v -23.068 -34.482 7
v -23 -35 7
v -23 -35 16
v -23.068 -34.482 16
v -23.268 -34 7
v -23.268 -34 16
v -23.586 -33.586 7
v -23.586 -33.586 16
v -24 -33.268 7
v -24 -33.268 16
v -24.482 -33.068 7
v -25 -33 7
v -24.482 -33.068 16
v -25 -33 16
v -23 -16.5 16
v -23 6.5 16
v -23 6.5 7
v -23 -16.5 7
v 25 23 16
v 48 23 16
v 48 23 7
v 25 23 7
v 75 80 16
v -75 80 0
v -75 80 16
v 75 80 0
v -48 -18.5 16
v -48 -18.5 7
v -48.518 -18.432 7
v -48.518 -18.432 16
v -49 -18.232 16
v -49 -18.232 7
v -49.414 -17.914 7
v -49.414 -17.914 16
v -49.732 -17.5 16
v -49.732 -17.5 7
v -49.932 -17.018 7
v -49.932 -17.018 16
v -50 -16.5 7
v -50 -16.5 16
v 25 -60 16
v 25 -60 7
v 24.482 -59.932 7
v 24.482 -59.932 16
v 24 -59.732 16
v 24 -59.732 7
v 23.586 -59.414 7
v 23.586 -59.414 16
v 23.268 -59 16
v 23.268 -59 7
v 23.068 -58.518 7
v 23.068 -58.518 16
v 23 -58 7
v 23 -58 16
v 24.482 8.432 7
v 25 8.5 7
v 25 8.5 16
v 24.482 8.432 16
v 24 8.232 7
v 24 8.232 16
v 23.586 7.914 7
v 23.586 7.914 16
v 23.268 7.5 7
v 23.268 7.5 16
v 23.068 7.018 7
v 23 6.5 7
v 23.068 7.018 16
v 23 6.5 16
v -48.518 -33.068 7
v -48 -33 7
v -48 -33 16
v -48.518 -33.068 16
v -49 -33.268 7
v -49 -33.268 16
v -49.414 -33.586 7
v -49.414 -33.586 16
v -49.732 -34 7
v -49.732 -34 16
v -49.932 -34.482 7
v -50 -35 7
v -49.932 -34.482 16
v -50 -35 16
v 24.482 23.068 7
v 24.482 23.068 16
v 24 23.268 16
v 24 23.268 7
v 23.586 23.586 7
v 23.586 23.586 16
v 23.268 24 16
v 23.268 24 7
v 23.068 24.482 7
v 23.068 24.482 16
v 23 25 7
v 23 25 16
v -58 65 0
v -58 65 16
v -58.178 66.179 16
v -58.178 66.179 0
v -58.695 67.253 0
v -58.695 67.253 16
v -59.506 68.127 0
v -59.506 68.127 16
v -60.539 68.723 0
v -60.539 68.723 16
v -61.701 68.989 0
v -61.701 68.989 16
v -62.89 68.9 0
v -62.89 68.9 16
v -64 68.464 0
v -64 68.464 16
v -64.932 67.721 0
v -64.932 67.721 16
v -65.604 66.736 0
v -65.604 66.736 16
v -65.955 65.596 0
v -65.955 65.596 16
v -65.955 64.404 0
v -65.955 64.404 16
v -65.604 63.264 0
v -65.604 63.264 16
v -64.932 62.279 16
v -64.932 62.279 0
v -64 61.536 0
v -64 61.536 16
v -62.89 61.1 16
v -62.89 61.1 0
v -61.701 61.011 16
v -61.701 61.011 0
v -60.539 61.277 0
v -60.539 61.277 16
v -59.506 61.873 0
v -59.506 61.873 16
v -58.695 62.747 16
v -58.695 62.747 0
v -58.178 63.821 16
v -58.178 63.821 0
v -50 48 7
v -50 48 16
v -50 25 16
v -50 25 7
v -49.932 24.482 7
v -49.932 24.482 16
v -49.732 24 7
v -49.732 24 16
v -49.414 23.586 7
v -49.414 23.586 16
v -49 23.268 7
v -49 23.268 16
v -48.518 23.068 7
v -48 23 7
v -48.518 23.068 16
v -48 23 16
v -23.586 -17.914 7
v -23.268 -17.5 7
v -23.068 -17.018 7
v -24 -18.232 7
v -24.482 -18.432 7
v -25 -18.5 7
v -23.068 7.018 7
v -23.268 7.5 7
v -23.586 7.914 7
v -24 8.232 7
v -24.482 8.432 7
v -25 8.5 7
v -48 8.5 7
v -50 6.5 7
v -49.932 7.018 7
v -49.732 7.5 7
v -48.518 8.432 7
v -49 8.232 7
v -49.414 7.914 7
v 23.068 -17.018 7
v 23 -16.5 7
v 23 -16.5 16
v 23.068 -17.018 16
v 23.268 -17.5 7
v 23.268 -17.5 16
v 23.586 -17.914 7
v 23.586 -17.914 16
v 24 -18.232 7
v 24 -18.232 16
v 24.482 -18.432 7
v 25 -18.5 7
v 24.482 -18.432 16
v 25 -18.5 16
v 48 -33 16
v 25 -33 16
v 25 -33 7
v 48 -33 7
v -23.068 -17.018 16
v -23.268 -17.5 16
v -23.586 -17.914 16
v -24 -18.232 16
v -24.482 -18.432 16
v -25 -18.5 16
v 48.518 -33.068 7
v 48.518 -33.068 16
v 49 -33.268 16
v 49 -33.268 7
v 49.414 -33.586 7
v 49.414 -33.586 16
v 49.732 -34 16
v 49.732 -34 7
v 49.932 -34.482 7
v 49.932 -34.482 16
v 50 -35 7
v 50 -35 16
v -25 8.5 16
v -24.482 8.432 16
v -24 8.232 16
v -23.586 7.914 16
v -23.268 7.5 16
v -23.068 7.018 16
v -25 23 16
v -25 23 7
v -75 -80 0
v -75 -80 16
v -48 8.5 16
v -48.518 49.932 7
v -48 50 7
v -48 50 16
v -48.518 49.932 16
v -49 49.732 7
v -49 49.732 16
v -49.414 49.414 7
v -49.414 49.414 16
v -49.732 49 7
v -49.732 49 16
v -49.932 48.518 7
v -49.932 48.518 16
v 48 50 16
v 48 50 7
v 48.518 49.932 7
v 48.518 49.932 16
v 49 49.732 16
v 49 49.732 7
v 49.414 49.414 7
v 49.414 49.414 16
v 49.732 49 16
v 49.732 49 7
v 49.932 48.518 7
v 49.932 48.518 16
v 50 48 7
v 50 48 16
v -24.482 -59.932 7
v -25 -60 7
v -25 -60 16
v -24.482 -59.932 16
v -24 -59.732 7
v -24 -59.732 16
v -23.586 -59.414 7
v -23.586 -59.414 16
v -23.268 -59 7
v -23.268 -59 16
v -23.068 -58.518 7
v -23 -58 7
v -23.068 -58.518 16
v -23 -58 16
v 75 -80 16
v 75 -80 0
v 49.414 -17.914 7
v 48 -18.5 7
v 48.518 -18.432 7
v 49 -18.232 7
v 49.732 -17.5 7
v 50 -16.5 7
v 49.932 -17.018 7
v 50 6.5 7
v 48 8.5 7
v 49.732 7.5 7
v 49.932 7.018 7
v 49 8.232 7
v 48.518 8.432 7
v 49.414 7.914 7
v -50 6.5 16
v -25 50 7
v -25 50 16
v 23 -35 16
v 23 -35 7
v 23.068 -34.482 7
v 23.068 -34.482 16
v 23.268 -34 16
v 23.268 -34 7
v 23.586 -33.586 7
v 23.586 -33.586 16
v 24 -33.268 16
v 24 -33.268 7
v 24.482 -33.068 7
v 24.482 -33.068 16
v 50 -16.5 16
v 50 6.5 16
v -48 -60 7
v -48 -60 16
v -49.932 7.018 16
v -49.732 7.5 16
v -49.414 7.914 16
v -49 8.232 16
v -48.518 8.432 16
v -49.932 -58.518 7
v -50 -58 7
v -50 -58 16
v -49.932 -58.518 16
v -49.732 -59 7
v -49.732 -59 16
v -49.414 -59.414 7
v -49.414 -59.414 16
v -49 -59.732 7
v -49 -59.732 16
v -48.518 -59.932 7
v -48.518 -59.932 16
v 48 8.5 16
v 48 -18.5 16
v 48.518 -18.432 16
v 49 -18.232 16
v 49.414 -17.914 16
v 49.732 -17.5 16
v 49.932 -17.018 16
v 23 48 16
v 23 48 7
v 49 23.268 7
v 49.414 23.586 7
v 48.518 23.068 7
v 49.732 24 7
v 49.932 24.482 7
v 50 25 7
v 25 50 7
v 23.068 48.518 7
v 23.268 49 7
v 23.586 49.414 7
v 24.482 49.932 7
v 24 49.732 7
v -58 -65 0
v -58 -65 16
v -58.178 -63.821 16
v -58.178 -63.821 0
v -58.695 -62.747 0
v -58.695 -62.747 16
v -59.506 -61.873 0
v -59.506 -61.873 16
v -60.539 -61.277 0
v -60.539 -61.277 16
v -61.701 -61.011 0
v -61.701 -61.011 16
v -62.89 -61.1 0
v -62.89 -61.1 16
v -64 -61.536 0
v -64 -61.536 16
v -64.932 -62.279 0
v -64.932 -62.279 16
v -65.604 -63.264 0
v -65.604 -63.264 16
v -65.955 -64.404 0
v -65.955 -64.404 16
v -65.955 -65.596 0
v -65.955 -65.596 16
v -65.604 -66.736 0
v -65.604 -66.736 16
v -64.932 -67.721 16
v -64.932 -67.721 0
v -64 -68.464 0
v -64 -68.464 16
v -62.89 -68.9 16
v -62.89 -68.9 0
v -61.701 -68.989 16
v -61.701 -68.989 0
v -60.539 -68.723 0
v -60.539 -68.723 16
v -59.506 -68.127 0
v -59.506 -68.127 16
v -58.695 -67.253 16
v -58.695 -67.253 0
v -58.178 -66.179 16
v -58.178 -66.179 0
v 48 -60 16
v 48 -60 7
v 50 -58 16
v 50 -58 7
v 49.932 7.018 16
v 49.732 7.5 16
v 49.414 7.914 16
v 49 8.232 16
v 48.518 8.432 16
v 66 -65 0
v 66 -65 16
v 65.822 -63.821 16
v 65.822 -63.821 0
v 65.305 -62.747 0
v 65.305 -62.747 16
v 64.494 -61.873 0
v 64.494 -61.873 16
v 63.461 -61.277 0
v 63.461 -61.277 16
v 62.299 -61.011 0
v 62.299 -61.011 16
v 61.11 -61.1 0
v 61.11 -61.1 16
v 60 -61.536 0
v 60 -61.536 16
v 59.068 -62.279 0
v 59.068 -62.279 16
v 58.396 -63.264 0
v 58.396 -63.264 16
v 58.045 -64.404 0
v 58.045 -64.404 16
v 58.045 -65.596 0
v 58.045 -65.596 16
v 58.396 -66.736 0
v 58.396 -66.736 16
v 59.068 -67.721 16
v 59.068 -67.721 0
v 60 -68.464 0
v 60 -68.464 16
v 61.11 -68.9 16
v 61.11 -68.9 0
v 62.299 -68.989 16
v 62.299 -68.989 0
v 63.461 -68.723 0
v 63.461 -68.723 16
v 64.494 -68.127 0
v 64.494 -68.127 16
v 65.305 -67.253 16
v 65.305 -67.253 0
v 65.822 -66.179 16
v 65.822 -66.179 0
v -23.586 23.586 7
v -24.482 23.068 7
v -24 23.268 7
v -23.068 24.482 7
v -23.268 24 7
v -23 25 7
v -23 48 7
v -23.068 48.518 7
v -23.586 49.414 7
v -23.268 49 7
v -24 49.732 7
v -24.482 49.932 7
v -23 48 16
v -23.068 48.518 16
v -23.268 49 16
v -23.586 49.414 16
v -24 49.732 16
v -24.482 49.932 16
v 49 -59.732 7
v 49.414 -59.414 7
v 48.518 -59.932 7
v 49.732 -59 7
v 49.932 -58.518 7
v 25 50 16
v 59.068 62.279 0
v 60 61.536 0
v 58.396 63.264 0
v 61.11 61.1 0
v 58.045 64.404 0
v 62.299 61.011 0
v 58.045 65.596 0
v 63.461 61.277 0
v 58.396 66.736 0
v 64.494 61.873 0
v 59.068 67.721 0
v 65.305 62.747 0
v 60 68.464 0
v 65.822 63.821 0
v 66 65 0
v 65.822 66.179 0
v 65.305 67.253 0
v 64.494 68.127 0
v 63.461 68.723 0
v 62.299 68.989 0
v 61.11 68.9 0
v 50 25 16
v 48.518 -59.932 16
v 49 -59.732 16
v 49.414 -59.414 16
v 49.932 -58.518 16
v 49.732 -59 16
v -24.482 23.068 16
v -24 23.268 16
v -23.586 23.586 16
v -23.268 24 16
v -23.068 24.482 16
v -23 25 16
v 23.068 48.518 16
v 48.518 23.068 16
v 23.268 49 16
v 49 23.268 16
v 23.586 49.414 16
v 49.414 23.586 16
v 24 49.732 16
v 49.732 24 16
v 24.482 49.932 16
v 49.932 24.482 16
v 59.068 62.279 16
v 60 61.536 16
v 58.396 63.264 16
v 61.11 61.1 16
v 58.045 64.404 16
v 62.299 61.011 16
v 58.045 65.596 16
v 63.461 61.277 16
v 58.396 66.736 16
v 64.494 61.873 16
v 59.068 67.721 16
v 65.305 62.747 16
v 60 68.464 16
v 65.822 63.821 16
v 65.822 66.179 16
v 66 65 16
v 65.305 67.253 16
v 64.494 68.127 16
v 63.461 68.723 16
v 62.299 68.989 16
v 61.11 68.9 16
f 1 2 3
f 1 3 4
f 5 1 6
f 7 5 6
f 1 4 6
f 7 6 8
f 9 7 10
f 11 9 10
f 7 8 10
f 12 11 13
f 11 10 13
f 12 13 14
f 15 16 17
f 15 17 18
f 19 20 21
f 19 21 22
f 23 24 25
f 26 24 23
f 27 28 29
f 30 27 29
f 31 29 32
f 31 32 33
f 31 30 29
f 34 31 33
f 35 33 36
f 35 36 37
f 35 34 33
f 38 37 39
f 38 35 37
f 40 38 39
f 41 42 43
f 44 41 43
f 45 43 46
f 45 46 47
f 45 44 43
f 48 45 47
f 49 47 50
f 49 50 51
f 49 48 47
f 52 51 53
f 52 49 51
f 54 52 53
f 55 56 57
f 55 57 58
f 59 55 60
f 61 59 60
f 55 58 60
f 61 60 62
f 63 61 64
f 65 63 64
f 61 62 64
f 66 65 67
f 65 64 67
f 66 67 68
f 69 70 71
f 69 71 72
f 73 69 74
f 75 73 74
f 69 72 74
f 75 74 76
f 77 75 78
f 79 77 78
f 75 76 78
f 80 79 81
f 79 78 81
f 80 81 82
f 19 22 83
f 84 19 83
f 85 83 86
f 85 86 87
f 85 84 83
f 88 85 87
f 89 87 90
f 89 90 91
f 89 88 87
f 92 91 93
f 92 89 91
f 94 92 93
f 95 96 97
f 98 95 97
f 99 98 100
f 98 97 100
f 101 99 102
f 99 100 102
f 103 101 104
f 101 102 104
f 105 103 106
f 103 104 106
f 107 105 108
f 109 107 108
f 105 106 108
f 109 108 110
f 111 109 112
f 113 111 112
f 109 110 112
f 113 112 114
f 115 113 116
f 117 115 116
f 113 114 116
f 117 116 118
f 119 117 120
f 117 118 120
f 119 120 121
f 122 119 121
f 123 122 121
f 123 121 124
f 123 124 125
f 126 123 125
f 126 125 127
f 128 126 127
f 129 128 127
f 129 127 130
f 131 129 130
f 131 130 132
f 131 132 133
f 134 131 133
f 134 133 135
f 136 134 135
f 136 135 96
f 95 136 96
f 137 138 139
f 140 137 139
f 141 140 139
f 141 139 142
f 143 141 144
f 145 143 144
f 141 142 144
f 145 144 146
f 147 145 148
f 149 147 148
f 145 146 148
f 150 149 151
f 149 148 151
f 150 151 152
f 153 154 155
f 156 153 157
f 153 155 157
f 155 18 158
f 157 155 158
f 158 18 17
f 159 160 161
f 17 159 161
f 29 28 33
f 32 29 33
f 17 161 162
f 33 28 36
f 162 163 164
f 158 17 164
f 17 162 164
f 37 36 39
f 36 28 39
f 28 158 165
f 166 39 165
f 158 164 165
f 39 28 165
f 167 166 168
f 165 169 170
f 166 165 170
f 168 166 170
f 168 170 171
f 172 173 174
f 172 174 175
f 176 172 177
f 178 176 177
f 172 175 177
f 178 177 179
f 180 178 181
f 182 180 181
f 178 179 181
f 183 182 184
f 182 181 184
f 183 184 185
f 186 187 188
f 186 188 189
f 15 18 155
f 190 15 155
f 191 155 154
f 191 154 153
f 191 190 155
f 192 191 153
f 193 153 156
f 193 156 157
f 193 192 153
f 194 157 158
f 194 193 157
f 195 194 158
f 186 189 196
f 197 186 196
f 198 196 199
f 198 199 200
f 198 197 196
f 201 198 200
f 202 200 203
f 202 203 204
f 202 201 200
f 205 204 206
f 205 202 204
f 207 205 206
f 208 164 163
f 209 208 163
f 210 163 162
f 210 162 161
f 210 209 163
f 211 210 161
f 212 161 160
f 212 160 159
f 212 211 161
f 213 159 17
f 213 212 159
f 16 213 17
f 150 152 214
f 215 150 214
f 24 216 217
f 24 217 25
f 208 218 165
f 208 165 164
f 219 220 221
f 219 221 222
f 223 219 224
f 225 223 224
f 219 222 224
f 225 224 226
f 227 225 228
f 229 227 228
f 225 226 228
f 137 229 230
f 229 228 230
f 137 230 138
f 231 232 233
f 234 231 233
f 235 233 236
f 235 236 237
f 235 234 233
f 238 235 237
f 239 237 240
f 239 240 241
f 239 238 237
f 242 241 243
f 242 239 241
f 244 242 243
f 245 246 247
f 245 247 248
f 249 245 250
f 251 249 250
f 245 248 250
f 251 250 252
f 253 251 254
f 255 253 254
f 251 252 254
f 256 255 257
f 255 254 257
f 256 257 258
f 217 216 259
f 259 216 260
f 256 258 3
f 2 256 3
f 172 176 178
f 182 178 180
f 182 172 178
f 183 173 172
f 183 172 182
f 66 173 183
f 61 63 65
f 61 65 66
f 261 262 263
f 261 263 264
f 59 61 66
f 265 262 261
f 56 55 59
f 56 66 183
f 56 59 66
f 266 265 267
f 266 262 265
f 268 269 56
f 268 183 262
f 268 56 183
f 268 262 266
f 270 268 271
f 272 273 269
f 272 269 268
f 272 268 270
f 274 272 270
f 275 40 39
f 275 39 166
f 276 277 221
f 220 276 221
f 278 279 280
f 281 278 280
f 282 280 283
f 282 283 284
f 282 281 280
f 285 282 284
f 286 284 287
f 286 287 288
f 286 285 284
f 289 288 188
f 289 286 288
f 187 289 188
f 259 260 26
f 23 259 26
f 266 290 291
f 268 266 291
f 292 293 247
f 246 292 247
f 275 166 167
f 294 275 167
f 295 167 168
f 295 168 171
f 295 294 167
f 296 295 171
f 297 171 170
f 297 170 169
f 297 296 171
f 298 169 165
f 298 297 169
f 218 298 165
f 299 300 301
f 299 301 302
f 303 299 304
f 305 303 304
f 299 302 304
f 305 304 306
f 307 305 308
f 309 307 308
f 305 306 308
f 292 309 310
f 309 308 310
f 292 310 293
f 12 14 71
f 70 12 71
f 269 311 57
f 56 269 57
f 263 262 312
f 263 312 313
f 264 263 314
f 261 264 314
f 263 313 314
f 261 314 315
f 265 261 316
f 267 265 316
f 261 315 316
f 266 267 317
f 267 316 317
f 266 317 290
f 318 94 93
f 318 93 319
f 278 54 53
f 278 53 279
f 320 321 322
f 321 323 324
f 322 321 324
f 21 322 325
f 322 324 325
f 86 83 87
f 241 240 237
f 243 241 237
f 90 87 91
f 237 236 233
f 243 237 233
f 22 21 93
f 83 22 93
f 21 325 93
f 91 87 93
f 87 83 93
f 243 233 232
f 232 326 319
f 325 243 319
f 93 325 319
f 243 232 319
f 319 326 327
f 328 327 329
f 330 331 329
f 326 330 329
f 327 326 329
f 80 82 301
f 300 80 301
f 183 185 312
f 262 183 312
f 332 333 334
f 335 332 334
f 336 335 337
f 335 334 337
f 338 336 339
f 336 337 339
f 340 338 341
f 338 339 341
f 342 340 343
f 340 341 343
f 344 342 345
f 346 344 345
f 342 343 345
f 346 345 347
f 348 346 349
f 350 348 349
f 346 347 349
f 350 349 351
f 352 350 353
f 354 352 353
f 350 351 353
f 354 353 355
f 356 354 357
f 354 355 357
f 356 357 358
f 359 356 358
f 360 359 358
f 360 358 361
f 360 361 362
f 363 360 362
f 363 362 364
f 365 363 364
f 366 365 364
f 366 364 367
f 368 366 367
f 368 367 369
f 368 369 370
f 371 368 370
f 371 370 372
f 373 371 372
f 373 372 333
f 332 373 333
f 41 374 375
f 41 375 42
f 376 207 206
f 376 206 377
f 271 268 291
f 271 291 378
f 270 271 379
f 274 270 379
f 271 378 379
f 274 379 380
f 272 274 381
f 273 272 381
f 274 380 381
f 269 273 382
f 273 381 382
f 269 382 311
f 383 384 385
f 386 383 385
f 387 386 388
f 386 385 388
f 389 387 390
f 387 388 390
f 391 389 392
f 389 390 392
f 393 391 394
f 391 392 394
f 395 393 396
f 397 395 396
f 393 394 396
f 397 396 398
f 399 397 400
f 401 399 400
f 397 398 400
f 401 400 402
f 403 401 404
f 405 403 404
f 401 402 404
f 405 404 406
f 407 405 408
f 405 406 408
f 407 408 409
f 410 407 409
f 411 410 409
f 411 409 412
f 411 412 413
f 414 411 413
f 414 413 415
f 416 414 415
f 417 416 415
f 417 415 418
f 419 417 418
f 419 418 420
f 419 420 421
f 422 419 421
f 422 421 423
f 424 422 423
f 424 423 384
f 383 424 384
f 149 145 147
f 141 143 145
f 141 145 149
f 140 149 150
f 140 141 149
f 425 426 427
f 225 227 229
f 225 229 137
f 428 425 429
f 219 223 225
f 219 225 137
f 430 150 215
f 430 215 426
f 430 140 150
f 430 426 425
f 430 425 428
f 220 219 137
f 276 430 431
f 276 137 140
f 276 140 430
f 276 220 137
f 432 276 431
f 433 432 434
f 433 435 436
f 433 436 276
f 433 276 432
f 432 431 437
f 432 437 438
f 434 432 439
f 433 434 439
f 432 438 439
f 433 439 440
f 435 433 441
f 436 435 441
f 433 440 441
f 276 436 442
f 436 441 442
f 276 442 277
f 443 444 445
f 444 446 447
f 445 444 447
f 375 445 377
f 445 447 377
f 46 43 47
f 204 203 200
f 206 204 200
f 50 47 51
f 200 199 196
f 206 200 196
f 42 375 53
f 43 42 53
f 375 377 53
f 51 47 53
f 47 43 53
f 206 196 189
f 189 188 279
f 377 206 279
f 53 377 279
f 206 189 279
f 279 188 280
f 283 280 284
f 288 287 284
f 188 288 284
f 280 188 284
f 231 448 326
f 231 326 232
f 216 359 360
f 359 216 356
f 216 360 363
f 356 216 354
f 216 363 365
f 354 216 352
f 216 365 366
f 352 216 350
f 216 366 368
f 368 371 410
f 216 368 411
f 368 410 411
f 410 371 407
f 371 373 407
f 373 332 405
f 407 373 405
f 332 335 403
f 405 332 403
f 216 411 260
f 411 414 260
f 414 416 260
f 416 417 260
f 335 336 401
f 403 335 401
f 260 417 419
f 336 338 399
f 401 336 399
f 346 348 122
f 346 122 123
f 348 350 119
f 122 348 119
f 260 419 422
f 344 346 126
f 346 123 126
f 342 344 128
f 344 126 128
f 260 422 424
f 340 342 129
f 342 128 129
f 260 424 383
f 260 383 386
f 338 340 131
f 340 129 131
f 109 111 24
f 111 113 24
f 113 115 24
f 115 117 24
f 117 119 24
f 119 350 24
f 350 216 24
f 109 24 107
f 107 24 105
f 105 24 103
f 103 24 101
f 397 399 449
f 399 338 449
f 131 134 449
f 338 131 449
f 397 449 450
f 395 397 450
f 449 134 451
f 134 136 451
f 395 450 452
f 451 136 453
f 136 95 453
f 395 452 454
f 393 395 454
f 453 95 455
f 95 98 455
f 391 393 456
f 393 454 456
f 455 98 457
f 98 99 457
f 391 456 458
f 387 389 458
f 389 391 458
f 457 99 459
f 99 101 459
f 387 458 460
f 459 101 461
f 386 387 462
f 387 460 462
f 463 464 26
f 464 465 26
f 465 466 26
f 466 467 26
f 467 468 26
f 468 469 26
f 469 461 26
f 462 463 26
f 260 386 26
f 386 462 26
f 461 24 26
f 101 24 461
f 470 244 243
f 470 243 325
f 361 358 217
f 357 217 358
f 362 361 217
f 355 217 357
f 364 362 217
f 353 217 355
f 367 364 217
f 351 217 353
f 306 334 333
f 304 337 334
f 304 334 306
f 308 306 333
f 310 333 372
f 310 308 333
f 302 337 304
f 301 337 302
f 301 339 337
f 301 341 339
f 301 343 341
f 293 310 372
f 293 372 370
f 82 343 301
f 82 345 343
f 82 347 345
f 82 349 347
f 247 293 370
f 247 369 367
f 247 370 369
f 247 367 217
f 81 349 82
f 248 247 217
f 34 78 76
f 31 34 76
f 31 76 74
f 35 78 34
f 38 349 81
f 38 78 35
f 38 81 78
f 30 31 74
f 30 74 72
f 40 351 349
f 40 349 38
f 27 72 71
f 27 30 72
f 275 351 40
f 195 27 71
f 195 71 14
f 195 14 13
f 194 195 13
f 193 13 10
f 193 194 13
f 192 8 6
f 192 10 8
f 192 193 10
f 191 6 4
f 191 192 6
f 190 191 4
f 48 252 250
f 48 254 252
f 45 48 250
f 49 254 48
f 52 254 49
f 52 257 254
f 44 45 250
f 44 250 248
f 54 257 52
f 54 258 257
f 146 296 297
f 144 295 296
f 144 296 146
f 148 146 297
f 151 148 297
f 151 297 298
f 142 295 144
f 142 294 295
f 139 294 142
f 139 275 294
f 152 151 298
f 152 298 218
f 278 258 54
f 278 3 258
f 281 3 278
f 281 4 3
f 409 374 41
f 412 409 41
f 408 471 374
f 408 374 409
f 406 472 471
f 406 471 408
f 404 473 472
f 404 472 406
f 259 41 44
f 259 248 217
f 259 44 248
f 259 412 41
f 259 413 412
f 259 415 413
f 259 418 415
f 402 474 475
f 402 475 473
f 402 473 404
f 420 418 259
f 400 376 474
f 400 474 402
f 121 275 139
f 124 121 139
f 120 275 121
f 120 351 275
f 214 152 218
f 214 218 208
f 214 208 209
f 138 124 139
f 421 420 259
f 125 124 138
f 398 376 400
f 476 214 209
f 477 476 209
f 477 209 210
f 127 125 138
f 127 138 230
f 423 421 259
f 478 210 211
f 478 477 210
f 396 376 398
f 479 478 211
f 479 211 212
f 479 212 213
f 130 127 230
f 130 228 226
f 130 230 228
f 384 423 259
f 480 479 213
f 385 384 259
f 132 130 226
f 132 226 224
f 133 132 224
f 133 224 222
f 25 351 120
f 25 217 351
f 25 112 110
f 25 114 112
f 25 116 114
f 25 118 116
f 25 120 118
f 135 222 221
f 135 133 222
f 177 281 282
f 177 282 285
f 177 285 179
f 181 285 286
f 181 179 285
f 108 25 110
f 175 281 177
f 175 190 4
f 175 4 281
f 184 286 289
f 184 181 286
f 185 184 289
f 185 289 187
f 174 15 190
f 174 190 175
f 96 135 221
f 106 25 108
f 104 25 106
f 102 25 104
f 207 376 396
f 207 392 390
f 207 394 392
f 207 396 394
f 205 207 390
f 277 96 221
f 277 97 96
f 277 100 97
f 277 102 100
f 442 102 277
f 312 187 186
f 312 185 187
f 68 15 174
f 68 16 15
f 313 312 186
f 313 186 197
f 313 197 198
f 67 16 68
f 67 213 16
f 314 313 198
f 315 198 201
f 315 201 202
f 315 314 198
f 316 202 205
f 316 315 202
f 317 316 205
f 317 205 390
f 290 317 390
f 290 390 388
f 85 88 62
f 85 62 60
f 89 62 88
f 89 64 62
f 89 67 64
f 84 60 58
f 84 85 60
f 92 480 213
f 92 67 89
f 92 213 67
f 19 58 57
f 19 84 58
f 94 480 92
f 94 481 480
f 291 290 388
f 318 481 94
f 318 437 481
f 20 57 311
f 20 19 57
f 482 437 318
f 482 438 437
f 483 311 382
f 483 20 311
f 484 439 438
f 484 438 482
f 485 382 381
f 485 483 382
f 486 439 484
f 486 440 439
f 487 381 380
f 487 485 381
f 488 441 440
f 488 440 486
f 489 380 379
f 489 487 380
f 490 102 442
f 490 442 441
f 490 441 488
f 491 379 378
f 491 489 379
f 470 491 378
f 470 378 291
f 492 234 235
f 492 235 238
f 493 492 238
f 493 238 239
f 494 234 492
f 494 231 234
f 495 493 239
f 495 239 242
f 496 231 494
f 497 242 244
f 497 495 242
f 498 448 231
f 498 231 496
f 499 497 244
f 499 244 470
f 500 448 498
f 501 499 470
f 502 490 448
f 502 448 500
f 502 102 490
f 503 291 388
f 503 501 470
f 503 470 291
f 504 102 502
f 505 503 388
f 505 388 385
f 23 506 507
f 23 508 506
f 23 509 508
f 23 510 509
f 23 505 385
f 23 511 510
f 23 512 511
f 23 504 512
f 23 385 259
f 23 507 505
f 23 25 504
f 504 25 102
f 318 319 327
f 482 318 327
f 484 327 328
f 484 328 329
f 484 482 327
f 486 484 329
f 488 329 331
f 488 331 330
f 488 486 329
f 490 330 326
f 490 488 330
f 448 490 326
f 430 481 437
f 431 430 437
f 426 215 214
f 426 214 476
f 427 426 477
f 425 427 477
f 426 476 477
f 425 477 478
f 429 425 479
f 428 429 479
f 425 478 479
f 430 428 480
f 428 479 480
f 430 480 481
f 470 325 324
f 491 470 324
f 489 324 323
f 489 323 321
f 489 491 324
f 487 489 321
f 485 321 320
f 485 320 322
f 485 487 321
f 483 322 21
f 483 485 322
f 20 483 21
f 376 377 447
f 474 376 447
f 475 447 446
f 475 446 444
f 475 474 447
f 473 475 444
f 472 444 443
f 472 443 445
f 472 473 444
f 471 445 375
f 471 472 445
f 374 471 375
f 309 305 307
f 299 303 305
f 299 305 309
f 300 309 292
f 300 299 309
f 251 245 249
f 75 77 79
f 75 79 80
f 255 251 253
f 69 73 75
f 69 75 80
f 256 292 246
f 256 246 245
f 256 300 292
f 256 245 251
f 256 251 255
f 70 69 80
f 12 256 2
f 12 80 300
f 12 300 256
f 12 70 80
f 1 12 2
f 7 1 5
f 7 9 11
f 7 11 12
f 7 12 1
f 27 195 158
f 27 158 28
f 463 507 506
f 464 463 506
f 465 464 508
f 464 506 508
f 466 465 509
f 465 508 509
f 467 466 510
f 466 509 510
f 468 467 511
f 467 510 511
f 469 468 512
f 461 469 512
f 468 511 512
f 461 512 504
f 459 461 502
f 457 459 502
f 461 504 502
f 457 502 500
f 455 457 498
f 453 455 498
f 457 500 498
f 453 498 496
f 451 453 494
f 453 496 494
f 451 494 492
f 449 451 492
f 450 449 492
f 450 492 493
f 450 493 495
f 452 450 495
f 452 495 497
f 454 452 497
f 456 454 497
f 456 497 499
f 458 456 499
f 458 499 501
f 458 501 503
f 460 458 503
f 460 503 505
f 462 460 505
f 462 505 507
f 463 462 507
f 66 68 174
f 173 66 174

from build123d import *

# Parameters (mm, degrees)
SKETCH1_W           = 150
SKETCH1_H           = 160
BOSS_EXTRUDE1_DEPTH = 16
CUT_EXTRUDE1_DEPTH  = 9
SKETCH3_R           = 4
CUT_EXTRUDE2_DEPTH  = 17


with BuildPart() as part:
    # Sketch1 → Boss-Extrude1 (new body)
    with BuildSketch(Plane.XY):
        Rectangle(SKETCH1_W, SKETCH1_H)
    extrude(amount=BOSS_EXTRUDE1_DEPTH)

    # Sketch2 → Cut-Extrude1 (cut)
    with BuildSketch(Plane.XY.offset(16)):
        with BuildLine():
            Line((-48, 23), (-25, 23))
            ThreePointArc((-25, 23), (-23.585786438, 23.585786438), (-23, 25))
            Line((-23, 25), (-23, 48))
            ThreePointArc((-23, 48), (-23.585786438, 49.414213562), (-25, 50))
            Line((-25, 50), (-48, 50))
            ThreePointArc((-48, 50), (-49.414213562, 49.414213562), (-50, 48))
            Line((-50, 48), (-50, 25))
            ThreePointArc((-50, 25), (-49.414213562, 23.585786438), (-48, 23))
        make_face()
        with BuildLine():
            Line((23, 25), (23, 48))
            ThreePointArc((23, 48), (23.585786438, 49.414213562), (25, 50))
            Line((25, 50), (48, 50))
            ThreePointArc((48, 50), (49.414213562, 49.414213562), (50, 48))
            Line((50, 48), (50, 25))
            ThreePointArc((50, 25), (49.414213562, 23.585786438), (48, 23))
            Line((48, 23), (25, 23))
            ThreePointArc((25, 23), (23.585786438, 23.585786438), (23, 25))
        make_face()
        with BuildLine():
            Line((-48, -60), (-25, -60))
            ThreePointArc((-25, -60), (-23.585786438, -59.414213562), (-23, -58))
            Line((-23, -58), (-23, -35))
            ThreePointArc((-23, -35), (-23.585786438, -33.585786438), (-25, -33))
            Line((-25, -33), (-48, -33))
            ThreePointArc((-48, -33), (-49.414213562, -33.585786438), (-50, -35))
            Line((-50, -35), (-50, -58))
            ThreePointArc((-50, -58), (-49.414213562, -59.414213562), (-48, -60))
        make_face()
        with BuildLine():
            Line((23, -58), (23, -35))
            ThreePointArc((23, -35), (23.585786438, -33.585786438), (25, -33))
            Line((25, -33), (48, -33))
            ThreePointArc((48, -33), (49.414213562, -33.585786438), (50, -35))
            Line((50, -35), (50, -58))
            ThreePointArc((50, -58), (49.414213562, -59.414213562), (48, -60))
            Line((48, -60), (25, -60))
            ThreePointArc((25, -60), (23.585786438, -59.414213562), (23, -58))
        make_face()
        with BuildLine():
            Line((-25, -18.5), (-48, -18.5))
            ThreePointArc((-48, -18.5), (-49.414213562, -17.914213562), (-50, -16.5))
            Line((-50, -16.5), (-50, 6.5))
            ThreePointArc((-50, 6.5), (-49.414213562, 7.914213562), (-48, 8.5))
            Line((-48, 8.5), (-25, 8.5))
            ThreePointArc((-25, 8.5), (-23.585786438, 7.914213562), (-23, 6.5))
            Line((-23, 6.5), (-23, -16.5))
            ThreePointArc((-23, -16.5), (-23.585786438, -17.914213562), (-25, -18.5))
        make_face()
        with BuildLine():
            Line((50, -16.5), (50, 6.5))
            ThreePointArc((50, 6.5), (49.414213562, 7.914213562), (48, 8.5))
            Line((48, 8.5), (25, 8.5))
            ThreePointArc((25, 8.5), (23.585786438, 7.914213562), (23, 6.5))
            Line((23, 6.5), (23, -16.5))
            ThreePointArc((23, -16.5), (23.585786438, -17.914213562), (25, -18.5))
            Line((25, -18.5), (48, -18.5))
            ThreePointArc((48, -18.5), (49.414213562, -17.914213562), (50, -16.5))
        make_face()
    extrude(amount=-CUT_EXTRUDE1_DEPTH, mode=Mode.SUBTRACT)

    # Sketch3 → Cut-Extrude2 (cut, through all)
    with BuildSketch(Plane.XY.offset(16)):
        with Locations((-62, 65)):
            Circle(SKETCH3_R)
        with Locations((62, 65)):
            Circle(SKETCH3_R)
        with Locations((62, -65)):
            Circle(SKETCH3_R)
        with Locations((-62, -65)):
            Circle(SKETCH3_R)
    extrude(amount=-CUT_EXTRUDE2_DEPTH, mode=Mode.SUBTRACT)


solid = part.part
